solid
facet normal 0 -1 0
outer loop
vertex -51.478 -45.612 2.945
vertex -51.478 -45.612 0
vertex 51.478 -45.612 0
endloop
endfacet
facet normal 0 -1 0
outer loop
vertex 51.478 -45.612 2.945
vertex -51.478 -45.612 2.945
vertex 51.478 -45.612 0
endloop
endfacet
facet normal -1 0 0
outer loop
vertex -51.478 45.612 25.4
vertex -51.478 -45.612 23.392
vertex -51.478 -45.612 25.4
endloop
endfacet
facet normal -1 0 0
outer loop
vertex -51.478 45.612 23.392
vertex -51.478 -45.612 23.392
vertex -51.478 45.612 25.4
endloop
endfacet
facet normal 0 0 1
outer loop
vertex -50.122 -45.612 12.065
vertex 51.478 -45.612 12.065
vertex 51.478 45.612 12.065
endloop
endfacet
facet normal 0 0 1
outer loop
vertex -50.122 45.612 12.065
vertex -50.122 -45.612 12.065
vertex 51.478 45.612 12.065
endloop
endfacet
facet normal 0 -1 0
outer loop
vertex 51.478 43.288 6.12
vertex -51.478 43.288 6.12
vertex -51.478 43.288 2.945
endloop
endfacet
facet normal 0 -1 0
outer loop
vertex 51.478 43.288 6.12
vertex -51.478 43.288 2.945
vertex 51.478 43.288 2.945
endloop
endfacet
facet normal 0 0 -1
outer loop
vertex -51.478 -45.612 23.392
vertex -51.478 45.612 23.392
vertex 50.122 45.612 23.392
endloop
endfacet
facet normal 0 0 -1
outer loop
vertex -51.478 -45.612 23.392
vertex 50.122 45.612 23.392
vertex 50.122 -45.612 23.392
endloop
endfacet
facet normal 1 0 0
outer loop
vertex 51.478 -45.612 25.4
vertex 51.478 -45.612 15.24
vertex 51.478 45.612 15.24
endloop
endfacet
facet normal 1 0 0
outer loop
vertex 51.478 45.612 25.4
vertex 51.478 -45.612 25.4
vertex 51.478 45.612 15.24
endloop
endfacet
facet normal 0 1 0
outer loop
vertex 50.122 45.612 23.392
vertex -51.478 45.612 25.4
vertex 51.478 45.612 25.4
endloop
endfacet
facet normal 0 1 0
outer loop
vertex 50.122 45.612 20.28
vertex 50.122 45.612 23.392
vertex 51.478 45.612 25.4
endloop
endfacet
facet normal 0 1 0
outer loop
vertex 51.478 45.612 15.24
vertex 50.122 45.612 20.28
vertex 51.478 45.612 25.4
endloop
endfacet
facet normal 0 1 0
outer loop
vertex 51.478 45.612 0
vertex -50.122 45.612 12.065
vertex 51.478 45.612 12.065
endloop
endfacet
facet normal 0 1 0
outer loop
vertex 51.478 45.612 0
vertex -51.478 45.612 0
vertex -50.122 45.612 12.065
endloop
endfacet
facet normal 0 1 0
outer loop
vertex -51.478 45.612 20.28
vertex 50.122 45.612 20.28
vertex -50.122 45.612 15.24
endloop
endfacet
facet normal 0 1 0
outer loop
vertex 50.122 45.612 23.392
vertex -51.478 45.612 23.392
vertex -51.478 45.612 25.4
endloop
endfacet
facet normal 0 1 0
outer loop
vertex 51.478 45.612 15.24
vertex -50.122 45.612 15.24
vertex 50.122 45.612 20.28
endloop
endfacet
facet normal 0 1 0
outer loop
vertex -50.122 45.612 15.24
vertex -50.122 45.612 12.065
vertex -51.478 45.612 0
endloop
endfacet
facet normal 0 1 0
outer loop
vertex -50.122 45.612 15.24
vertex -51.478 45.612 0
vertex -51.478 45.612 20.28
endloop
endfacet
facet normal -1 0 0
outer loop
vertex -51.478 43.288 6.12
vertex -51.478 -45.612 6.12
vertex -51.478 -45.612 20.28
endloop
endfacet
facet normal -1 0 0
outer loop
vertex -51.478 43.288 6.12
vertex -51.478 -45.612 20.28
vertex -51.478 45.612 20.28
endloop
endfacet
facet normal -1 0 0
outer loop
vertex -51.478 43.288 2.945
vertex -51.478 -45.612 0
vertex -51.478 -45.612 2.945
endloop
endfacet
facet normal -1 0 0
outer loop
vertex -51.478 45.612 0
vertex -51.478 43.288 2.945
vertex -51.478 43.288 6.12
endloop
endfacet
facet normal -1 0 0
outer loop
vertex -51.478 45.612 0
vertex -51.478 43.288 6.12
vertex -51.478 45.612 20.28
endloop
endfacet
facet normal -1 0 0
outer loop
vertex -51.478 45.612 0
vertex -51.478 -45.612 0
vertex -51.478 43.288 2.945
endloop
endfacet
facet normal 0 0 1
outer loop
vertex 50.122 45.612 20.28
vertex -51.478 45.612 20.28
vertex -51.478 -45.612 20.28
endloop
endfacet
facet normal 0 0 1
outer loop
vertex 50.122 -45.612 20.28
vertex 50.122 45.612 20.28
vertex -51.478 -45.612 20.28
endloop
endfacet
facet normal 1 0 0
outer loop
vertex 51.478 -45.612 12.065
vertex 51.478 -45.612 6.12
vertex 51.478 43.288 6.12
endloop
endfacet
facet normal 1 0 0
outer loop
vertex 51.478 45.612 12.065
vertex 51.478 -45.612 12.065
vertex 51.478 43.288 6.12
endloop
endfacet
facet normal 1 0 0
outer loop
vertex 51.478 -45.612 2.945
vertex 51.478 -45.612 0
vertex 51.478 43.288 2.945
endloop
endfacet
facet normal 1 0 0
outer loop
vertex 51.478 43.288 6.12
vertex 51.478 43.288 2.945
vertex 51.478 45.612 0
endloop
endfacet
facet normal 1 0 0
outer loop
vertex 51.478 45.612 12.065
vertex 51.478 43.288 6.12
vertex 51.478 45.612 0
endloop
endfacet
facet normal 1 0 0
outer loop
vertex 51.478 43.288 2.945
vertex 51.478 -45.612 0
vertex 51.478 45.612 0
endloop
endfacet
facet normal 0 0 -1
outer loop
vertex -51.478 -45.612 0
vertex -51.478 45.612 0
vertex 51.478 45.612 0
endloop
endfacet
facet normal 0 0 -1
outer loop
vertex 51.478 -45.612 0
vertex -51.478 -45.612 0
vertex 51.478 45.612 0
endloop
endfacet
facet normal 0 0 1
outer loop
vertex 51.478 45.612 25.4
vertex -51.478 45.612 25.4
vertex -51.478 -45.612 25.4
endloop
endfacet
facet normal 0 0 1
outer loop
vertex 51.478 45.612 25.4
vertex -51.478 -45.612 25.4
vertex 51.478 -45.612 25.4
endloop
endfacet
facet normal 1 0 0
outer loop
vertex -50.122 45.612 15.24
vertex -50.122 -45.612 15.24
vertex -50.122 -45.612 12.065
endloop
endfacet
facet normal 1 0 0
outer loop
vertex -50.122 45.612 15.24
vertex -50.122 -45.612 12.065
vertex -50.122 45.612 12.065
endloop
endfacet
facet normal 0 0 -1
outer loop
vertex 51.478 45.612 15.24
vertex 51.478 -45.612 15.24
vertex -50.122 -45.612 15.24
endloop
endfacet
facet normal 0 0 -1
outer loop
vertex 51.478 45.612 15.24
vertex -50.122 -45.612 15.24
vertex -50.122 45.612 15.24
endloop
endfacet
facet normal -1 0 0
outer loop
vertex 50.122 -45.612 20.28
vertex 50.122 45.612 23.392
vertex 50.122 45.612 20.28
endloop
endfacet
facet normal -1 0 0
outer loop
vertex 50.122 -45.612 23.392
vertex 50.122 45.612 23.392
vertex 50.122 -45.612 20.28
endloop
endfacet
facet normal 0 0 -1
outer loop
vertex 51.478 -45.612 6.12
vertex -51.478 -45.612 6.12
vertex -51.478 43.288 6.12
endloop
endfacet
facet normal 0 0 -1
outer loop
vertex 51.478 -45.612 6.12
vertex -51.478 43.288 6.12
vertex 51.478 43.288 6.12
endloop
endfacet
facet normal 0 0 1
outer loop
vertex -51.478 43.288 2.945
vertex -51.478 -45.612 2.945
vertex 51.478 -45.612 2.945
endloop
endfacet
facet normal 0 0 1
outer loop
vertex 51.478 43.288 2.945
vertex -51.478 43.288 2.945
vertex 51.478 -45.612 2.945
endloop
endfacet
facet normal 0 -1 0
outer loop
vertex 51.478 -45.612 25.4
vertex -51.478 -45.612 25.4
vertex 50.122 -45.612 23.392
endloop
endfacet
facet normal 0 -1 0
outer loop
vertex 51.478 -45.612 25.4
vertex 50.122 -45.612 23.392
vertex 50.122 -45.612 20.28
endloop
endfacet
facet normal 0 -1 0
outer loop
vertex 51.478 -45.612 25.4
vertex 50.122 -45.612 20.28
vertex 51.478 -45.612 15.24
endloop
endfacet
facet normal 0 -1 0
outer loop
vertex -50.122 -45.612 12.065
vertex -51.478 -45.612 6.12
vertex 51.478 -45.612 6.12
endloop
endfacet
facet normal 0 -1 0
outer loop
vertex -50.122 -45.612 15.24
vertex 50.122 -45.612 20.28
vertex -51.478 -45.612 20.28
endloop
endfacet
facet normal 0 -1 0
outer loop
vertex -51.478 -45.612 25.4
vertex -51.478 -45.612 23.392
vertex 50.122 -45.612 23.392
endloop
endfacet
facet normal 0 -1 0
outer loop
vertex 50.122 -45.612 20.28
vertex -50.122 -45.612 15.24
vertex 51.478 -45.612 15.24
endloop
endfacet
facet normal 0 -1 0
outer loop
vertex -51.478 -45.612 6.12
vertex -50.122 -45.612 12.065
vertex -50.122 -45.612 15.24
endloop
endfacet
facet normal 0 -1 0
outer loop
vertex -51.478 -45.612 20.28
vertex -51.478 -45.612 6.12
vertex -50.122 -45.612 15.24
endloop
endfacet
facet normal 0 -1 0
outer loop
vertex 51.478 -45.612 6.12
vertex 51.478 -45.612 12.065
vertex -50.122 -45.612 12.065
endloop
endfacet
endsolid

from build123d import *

# Parameters (mm, degrees)
F0_W     = 102.955818
F0_H     = 91.223456
F1_DEPTH = 25.4
F2_W     = 91.223456
F2_H     = 3.111502
F3_DEPTH = 101.6
F4_W     = 91.223456
F4_H     = 3.175
F5_DEPTH = 101.6
F6_W     = 102.955818
F6_H     = 3.175
F7_DEPTH = 88.9


with BuildPart() as f1:
    # F0 (on Top) → F1 (new body)
    with BuildSketch(Plane.XY):
        Rectangle(F0_W, F0_H)
    extrude(amount=F1_DEPTH)

    # F2 (on face) → F3 (cut)
    with BuildSketch(Plane(origin=(-51.477909, 0, 0), x_dir=(0, -1, 0), z_dir=(-1, 0, 0))):
        with Locations((0, 21.836062)):
            Rectangle(F2_W, F2_H)
    extrude(amount=-F3_DEPTH, mode=Mode.SUBTRACT)

    # F4 (on face) → F5 (cut)
    with BuildSketch(Plane.YZ.offset(51.477909)):
        with Locations((0, 13.6525)):
            Rectangle(F4_W, F4_H)
    extrude(amount=-F5_DEPTH, mode=Mode.SUBTRACT)

    # F6 (on face) → F7 (cut)
    with BuildSketch(Plane.XZ.offset(45.611728)):
        with Locations((0, 4.532312)):
            Rectangle(F6_W, F6_H)
    extrude(amount=-F7_DEPTH, mode=Mode.SUBTRACT)


solid = f1.part
